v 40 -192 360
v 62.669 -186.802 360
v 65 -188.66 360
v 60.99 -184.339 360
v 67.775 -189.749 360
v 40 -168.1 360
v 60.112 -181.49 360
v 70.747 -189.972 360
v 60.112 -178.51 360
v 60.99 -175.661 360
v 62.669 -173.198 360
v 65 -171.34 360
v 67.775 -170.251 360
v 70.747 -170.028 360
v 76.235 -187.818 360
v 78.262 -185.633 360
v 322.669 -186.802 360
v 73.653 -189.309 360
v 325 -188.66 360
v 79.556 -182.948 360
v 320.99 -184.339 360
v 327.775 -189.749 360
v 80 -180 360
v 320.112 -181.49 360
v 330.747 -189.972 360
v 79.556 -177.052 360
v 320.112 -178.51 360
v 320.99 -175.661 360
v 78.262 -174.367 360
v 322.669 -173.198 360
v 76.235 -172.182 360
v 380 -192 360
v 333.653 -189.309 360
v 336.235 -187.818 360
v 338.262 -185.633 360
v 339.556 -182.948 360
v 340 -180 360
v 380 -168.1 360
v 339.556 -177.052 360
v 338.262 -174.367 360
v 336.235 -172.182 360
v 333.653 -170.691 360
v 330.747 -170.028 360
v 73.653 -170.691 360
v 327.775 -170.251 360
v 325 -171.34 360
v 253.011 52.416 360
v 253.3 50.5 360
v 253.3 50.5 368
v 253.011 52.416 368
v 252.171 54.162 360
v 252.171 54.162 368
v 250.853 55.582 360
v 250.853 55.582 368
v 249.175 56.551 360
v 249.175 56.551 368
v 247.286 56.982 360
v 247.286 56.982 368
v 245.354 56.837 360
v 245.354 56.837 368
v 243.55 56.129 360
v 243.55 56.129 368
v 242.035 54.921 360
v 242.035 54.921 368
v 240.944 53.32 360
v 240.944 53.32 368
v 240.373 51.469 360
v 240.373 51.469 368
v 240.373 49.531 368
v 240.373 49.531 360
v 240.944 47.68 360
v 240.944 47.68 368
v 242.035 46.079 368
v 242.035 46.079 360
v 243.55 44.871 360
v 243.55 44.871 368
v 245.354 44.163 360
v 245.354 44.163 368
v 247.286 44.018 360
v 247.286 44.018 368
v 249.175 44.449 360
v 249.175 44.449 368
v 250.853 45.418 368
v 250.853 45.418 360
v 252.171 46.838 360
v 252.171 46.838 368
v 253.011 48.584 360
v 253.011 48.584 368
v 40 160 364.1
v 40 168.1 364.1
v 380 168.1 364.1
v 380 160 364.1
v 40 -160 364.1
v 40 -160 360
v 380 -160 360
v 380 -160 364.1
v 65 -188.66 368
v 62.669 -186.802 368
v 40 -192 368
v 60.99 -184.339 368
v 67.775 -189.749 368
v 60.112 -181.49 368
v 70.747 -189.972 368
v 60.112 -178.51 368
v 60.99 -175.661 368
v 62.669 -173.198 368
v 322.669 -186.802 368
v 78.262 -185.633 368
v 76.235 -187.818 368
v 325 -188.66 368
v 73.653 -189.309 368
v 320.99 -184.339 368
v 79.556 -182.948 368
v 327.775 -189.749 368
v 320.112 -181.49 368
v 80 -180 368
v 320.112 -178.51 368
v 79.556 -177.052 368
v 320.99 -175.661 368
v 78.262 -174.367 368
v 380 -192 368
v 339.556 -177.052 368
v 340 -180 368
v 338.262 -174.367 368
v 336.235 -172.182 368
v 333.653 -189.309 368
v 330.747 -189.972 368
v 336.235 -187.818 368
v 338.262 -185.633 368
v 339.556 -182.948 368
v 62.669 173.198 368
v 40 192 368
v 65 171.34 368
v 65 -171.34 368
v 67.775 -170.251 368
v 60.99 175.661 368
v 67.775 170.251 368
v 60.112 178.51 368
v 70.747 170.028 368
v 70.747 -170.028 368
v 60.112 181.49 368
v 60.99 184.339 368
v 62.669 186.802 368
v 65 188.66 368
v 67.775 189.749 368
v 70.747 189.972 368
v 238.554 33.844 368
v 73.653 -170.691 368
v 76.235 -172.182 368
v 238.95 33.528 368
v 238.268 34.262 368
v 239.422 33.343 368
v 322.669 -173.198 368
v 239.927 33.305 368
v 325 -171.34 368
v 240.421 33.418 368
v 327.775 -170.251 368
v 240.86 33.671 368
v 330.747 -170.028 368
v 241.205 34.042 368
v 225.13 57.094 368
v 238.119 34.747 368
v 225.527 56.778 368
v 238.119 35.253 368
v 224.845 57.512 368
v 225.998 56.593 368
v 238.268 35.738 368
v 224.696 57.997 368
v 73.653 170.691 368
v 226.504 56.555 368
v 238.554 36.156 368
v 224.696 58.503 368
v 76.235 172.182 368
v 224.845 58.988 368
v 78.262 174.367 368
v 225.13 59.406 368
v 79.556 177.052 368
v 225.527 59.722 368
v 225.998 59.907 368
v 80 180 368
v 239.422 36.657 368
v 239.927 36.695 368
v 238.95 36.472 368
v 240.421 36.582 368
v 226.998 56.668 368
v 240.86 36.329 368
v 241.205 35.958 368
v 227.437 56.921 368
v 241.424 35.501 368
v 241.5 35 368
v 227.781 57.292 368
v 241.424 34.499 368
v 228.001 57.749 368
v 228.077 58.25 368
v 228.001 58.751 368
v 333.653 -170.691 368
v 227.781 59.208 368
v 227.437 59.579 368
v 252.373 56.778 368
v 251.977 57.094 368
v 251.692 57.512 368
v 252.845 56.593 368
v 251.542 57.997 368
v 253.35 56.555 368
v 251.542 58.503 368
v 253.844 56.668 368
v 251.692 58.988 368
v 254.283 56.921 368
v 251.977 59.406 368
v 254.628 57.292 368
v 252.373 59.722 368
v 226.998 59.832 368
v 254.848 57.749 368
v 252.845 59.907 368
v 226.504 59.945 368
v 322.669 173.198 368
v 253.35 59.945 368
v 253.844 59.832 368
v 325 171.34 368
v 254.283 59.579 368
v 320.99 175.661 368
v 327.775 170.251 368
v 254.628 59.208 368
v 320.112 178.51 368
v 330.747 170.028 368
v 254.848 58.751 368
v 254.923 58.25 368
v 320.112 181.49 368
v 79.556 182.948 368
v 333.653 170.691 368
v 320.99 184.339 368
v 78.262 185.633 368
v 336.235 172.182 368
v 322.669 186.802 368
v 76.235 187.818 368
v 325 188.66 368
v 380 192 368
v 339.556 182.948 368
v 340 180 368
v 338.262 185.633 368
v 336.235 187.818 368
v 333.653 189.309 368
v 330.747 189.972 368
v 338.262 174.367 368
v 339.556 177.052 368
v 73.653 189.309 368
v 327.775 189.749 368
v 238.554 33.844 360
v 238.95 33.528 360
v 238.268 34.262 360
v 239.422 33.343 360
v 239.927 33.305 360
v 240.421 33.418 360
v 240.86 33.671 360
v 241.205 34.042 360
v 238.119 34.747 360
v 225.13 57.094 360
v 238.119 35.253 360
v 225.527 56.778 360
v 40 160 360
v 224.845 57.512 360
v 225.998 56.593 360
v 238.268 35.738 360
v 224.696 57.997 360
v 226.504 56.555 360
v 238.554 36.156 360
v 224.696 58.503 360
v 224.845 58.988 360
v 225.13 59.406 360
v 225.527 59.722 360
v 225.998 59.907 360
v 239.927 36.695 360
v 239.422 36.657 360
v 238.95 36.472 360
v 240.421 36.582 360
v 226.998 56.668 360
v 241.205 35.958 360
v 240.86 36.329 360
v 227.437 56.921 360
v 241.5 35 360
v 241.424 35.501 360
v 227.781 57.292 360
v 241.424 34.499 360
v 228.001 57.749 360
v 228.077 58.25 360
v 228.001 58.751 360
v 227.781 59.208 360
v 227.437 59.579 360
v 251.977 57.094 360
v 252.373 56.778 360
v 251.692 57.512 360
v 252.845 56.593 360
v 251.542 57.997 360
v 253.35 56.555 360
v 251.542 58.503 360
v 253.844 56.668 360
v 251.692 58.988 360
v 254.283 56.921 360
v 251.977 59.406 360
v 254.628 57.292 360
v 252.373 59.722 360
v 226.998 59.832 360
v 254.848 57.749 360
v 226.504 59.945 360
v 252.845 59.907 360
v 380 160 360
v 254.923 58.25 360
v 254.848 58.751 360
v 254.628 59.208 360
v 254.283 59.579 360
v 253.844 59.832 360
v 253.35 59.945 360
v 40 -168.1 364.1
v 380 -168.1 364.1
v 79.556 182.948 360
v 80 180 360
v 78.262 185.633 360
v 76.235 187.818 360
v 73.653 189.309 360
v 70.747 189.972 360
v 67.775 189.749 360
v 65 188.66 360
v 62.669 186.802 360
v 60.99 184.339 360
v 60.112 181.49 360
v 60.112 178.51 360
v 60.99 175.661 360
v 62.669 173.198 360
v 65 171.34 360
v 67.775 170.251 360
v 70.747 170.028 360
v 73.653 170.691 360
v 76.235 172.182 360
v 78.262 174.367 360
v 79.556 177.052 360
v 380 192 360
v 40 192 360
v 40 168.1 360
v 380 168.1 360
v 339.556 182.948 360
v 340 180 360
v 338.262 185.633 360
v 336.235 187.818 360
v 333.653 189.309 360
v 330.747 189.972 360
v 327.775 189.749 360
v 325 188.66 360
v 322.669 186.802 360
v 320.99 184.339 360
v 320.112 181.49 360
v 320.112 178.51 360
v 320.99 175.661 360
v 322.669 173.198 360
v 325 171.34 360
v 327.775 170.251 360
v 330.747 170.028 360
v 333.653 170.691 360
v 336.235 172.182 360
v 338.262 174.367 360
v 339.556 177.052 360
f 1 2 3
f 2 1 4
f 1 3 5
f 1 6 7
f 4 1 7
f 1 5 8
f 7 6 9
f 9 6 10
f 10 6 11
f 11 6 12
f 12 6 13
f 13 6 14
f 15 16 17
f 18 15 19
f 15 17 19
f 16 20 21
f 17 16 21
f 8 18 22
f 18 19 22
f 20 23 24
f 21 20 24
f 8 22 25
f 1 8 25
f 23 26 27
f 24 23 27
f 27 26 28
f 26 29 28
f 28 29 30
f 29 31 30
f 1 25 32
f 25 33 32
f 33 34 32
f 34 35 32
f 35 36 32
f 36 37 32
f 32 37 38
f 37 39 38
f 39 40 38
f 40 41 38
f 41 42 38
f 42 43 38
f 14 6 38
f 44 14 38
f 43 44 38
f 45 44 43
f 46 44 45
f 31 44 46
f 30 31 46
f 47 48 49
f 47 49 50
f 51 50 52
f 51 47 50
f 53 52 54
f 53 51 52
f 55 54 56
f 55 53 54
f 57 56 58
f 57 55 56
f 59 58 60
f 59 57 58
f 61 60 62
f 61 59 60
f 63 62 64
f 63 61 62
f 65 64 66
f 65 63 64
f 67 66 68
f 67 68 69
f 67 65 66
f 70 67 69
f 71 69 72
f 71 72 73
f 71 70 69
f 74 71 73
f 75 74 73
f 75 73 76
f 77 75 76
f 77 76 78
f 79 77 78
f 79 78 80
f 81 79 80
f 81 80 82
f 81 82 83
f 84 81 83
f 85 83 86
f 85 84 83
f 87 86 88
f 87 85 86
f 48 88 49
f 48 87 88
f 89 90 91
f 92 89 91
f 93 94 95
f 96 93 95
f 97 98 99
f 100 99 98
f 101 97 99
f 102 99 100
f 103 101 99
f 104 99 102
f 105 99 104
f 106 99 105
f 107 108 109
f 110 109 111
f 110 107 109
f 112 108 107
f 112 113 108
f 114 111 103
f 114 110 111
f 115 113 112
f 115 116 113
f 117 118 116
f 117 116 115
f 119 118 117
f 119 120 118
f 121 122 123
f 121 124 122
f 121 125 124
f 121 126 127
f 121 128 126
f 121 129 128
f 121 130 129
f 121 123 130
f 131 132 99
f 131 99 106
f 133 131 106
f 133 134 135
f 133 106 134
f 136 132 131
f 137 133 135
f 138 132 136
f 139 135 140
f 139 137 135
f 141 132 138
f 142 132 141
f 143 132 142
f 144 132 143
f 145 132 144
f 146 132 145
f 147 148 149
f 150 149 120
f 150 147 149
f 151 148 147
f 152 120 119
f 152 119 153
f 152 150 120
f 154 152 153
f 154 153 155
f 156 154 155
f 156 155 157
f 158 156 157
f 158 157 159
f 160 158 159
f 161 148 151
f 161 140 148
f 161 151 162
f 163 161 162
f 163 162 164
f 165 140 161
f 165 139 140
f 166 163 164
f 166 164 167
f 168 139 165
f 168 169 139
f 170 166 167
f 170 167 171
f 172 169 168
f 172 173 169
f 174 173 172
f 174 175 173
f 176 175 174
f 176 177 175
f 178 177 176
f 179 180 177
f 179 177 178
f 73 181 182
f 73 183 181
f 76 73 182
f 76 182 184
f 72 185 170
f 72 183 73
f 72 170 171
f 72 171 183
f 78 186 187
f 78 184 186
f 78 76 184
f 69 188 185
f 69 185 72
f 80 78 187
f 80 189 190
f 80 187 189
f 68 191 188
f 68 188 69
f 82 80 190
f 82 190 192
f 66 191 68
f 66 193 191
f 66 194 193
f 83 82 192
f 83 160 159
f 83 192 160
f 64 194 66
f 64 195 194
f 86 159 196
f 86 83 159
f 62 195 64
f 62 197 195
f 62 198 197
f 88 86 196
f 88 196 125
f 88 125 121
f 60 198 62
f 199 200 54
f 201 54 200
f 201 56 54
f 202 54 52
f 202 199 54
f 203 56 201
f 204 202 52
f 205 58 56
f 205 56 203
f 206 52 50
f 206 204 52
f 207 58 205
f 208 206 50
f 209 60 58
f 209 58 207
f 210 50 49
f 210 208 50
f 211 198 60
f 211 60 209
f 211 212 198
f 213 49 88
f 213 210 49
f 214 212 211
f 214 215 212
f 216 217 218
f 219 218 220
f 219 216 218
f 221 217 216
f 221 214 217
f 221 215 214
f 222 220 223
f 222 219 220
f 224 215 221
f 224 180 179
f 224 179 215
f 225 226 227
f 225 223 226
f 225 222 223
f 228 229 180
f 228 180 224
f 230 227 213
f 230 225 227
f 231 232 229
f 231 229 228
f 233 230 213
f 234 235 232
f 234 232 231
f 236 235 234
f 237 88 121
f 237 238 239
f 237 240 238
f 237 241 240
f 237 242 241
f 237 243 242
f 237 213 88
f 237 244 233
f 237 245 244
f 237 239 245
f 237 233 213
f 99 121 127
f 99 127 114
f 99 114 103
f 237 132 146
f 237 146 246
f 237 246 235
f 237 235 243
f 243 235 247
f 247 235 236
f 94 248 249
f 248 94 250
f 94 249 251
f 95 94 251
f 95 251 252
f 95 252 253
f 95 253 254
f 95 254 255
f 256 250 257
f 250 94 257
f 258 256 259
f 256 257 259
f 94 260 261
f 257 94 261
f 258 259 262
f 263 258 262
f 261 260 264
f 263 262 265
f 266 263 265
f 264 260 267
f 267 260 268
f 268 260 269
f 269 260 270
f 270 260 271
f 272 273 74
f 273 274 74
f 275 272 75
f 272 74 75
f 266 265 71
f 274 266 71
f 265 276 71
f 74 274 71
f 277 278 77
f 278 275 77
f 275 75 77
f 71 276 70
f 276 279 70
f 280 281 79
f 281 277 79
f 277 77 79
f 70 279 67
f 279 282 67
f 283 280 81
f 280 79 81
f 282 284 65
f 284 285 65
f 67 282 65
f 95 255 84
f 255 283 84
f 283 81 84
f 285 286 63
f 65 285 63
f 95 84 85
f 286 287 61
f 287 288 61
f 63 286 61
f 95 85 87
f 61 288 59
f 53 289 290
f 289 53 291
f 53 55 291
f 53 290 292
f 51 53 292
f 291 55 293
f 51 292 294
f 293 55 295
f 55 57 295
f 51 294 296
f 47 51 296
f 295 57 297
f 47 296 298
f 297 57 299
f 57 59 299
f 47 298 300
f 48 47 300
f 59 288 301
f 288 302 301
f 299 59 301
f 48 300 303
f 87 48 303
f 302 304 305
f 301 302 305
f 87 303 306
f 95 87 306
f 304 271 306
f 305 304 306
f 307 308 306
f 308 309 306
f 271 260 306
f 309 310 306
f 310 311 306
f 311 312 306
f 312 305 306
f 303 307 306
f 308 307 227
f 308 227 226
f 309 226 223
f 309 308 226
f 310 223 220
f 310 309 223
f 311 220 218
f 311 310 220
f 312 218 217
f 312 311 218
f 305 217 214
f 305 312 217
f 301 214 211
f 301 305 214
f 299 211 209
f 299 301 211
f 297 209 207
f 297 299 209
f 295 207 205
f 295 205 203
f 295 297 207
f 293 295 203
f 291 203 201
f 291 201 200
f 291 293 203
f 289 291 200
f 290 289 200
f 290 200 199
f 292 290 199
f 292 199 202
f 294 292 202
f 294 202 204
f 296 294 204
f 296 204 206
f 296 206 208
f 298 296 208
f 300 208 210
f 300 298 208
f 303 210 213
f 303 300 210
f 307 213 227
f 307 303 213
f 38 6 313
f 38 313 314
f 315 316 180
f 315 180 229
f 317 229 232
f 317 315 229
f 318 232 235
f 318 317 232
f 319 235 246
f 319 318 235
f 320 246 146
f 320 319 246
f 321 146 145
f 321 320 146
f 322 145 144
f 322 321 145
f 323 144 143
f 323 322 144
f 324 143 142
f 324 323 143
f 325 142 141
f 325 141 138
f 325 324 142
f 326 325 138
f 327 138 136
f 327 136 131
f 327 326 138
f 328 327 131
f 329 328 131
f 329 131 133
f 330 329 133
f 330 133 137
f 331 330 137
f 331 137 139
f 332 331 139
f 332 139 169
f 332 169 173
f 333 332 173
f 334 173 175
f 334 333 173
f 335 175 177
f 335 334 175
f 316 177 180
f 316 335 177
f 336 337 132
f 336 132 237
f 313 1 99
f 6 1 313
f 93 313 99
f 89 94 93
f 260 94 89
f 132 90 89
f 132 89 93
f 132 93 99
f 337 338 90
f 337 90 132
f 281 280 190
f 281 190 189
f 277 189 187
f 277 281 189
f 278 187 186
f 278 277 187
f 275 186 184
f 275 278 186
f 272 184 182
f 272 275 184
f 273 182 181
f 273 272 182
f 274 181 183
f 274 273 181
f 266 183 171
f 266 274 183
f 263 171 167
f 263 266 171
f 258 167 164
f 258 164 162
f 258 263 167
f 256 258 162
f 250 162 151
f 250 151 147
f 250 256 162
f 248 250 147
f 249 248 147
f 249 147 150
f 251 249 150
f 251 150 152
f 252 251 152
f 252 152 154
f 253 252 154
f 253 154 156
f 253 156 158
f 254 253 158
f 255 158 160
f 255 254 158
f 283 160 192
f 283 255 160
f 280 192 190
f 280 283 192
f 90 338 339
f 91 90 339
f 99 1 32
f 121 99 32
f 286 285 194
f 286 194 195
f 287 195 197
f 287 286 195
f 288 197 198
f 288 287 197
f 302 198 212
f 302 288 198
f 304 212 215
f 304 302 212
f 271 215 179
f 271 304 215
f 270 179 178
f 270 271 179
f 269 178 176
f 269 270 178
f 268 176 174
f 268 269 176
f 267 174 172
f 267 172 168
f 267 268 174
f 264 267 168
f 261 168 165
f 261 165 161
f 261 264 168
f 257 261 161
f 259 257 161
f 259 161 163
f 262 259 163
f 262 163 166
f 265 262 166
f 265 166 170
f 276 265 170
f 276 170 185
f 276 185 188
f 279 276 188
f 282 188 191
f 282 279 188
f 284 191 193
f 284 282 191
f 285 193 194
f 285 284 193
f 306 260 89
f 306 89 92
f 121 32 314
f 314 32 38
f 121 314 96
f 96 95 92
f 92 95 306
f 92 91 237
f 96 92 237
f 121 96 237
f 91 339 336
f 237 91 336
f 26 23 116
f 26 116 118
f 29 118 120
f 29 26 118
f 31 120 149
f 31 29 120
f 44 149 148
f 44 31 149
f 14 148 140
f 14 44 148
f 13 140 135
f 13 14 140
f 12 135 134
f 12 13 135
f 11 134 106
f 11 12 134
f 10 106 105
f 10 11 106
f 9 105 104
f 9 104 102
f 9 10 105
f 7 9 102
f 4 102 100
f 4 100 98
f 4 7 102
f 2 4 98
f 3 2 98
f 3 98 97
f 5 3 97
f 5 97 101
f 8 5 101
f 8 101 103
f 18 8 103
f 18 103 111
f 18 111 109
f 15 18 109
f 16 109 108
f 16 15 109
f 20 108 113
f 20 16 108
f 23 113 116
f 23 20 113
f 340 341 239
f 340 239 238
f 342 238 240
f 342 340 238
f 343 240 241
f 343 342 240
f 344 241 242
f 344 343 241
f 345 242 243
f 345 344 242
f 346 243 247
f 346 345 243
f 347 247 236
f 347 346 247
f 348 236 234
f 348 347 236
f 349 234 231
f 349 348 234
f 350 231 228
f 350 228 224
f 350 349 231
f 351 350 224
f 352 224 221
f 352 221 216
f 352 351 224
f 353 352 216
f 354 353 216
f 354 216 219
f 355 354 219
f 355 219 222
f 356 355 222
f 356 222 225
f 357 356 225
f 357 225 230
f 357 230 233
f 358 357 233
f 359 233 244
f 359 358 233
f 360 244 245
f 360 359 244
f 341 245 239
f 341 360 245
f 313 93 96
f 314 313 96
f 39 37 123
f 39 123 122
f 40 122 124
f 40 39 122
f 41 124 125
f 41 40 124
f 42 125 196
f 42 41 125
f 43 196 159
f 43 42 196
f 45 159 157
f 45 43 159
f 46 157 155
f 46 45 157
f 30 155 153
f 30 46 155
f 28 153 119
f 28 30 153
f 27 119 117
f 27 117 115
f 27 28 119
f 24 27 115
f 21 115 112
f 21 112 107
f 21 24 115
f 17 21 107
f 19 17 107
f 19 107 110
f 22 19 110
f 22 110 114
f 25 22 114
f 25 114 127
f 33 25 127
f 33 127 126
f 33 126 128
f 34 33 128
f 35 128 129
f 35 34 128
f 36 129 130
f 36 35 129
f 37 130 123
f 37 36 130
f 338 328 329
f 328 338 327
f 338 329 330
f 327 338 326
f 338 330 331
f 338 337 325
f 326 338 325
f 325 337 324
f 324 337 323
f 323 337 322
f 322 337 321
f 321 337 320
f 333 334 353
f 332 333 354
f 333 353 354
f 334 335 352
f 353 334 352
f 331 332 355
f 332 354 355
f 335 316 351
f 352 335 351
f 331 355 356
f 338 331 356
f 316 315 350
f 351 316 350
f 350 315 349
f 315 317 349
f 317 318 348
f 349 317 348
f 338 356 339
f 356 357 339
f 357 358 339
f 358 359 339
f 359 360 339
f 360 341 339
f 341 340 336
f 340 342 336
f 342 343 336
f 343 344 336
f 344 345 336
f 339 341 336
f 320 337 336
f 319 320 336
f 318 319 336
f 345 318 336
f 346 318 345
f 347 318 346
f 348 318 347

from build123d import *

# Parameters (mm, degrees)
SKETCH023_W     = 340
SKETCH023_H     = 384
SKETCH023_R     = 1.7
SKETCH023_R_2   = 6.5
SKETCH023_R_3   = 10
PAD015_DEPTH    = 8
SKETCH040_W     = 340
SKETCH040_H     = 8.1
POCKET009_DEPTH = 4.1


with BuildPart() as wall_inner:
    # Sketch023 → Pad015 (new body)
    with BuildSketch(Plane.XY.offset(40)):
        with Locations((210, 0)):
            Rectangle(SKETCH023_W, SKETCH023_H)
        with Locations((226.376606, 58.25)):
            Circle(SKETCH023_R, mode=Mode.SUBTRACT)
        with Locations((253.223394, 58.25)):
            Circle(SKETCH023_R, mode=Mode.SUBTRACT)
        with Locations((239.8, 35)):
            Circle(SKETCH023_R, mode=Mode.SUBTRACT)
        with Locations((246.8, 50.5)):
            Circle(SKETCH023_R_2, mode=Mode.SUBTRACT)
        with Locations((70, 180)):
            Circle(SKETCH023_R_3, mode=Mode.SUBTRACT)
        with Locations((330, 180)):
            Circle(SKETCH023_R_3, mode=Mode.SUBTRACT)
        with Locations((70, -180)):
            Circle(SKETCH023_R_3, mode=Mode.SUBTRACT)
        with Locations((330, -180)):
            Circle(SKETCH023_R_3, mode=Mode.SUBTRACT)
    extrude(amount=-PAD015_DEPTH)

    # Sketch040 → Pocket009 (cut)
    with BuildSketch(Plane.XY.offset(40)):
        with Locations((210, 164.05)):
            Rectangle(SKETCH040_W, SKETCH040_H)
        with Locations((210, -164.05)):
            Rectangle(SKETCH040_W, SKETCH040_H)
    extrude(amount=-POCKET009_DEPTH, mode=Mode.SUBTRACT)


with BuildPart() as part_mirroring004:
    # Part__Mirroring004: instance of Wall-inner
    add(wall_inner.part.mirror(Plane(origin=(0, 0, 200), x_dir=(0, 1, 0), z_dir=(0, 0, 1))))


solid = part_mirroring004.part
